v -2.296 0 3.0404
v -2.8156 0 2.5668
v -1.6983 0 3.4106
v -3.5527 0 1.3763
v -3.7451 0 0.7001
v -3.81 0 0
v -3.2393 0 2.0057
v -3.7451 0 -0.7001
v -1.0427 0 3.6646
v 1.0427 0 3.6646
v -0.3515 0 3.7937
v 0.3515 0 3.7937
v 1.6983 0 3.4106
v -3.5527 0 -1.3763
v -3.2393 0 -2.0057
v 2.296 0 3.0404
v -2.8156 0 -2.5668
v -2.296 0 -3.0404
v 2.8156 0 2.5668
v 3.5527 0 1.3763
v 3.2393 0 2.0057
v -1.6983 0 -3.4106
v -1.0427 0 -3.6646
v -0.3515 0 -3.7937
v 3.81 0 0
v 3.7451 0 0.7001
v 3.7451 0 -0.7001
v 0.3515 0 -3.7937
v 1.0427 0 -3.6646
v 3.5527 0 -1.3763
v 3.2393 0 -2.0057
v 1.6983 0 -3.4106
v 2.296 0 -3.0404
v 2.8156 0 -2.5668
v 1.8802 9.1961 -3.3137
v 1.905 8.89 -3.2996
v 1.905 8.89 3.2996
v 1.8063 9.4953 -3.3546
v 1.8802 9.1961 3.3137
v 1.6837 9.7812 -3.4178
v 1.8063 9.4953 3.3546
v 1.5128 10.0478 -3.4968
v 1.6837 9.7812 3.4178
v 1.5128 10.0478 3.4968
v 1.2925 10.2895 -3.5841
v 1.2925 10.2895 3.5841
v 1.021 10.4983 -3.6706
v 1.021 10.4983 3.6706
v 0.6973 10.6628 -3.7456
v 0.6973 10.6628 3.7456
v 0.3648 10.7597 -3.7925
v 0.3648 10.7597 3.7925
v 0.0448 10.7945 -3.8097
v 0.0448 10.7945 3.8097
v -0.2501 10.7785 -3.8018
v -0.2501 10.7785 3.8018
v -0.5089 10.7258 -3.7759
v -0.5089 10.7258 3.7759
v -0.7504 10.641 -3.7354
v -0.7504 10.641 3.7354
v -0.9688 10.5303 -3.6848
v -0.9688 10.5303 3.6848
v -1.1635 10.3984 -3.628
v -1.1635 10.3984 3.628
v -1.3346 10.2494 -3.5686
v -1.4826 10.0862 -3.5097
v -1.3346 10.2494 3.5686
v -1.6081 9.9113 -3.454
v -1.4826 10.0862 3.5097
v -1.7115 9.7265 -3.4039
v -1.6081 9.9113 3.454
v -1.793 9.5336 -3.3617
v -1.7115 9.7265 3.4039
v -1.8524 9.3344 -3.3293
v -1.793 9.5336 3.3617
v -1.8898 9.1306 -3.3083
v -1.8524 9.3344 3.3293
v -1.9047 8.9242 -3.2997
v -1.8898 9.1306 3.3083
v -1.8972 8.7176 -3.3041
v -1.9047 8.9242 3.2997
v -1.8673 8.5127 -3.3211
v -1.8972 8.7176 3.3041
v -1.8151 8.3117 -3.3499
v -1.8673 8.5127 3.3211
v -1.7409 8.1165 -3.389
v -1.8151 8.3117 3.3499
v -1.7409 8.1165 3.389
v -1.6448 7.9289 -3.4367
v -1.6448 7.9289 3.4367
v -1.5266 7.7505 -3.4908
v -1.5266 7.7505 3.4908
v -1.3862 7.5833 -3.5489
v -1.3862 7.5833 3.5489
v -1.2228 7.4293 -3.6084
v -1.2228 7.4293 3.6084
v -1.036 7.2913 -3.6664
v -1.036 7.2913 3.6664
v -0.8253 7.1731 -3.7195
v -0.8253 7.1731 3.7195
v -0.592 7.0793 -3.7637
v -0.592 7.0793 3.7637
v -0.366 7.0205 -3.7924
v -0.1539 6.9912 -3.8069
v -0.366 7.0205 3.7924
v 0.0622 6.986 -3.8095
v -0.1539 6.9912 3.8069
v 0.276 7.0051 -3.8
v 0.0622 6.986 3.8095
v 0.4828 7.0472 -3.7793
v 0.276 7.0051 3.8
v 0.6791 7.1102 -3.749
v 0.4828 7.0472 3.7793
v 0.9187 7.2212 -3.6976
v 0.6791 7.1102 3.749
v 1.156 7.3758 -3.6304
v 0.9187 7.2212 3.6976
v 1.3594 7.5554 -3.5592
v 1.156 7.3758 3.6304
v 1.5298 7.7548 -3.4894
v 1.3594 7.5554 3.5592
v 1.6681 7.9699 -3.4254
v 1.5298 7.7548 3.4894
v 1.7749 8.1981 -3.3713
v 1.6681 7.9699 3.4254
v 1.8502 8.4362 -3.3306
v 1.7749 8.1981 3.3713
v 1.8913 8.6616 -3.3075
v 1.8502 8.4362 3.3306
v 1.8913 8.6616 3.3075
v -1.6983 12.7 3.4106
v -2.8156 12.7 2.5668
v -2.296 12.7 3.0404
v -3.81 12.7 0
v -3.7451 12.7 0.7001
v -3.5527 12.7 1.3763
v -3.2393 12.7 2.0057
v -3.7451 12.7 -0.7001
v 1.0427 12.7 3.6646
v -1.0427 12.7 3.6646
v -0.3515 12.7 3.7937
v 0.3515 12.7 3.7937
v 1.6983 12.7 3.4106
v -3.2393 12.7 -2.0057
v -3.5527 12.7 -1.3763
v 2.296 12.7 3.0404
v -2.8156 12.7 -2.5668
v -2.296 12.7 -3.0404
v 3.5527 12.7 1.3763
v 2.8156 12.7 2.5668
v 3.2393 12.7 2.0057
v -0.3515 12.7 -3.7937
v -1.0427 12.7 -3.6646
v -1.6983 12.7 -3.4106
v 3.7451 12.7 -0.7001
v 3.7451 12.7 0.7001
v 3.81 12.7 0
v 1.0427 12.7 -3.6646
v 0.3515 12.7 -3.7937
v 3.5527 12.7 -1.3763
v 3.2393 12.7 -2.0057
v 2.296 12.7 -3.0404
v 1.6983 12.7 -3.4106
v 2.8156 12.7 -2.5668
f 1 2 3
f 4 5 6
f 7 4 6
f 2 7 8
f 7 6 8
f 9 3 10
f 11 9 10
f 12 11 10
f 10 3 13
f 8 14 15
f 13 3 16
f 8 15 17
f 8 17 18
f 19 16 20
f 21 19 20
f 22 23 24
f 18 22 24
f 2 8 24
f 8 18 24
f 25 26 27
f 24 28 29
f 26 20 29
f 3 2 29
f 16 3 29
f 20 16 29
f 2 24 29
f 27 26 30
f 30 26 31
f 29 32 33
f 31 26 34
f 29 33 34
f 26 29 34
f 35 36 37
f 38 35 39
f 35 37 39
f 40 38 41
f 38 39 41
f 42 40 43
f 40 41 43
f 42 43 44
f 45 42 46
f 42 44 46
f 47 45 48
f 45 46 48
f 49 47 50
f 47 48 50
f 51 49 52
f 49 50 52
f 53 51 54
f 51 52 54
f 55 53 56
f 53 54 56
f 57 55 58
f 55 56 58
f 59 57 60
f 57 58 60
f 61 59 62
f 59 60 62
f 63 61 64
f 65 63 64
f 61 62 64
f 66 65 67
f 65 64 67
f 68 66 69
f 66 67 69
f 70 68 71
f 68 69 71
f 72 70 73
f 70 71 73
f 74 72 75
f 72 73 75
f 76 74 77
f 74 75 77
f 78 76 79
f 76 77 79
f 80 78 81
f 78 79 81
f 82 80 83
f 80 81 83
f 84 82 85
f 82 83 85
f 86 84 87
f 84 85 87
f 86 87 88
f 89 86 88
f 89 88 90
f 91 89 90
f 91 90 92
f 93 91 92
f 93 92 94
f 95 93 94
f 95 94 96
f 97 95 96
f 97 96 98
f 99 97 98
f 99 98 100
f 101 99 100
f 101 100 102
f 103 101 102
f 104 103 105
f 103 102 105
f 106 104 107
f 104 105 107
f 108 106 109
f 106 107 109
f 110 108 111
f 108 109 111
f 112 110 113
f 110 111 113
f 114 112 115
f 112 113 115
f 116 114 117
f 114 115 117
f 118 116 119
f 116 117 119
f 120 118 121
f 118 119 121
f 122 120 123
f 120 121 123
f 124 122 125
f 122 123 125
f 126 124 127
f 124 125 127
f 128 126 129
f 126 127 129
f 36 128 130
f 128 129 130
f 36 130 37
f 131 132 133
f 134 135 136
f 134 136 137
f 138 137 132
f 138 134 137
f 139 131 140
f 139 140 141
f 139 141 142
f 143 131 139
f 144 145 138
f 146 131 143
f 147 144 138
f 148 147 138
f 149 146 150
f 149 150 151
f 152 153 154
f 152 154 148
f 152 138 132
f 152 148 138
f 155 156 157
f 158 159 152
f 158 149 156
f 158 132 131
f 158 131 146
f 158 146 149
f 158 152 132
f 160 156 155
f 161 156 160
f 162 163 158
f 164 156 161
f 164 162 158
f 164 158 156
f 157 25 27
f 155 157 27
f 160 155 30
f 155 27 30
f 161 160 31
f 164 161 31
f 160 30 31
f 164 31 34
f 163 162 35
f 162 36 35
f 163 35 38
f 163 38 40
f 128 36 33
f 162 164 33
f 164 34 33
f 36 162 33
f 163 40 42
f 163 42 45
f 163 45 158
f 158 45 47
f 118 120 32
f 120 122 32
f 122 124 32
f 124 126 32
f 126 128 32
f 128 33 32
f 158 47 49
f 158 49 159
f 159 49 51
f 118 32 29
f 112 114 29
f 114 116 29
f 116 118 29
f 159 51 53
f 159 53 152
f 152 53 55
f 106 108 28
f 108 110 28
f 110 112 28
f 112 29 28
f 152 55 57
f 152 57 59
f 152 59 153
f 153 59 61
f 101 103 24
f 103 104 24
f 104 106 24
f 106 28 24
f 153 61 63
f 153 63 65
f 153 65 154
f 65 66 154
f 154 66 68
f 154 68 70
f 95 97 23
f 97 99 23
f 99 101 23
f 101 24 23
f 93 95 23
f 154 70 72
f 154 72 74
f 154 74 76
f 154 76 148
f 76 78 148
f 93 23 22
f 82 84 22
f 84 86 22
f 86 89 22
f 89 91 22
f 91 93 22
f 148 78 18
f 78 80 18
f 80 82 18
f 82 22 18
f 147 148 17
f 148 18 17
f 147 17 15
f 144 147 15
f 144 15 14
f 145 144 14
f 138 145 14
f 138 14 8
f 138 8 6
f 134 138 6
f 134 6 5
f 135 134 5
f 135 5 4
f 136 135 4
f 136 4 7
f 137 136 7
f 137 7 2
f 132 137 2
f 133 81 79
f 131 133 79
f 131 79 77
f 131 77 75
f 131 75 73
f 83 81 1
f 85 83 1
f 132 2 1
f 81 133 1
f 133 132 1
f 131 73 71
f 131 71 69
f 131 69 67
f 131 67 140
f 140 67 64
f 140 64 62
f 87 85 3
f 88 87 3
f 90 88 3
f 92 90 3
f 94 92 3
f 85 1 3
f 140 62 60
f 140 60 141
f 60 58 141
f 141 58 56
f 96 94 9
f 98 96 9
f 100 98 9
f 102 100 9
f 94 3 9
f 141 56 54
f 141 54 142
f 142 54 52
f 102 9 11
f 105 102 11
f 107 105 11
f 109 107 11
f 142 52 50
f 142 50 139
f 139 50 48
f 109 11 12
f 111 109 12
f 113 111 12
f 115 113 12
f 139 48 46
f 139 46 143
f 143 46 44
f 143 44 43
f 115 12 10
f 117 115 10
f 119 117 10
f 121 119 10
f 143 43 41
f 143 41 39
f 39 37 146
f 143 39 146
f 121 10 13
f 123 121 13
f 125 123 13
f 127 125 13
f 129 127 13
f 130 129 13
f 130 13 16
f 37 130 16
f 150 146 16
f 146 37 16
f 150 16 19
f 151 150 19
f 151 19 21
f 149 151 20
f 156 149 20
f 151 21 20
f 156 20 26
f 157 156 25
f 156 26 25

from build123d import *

# Parameters (mm, degrees)
SKETCH1_R                      = 3.81
BOSS_EXTRUDE1_DEPTH            = 12.7
CUT_EXTRUDE1_REACH             = 15.796
CUT_EXTRUDE1_END_RADIUS        = 3.81
SKETCH2_R                      = 1.905
CUT_EXTRUDE1_DIRECTION_2_DEPTH = 19.05


with BuildPart() as part:
    # Sketch1 → Boss-Extrude1 (new body)
    with BuildSketch(Plane(origin=(0, 0, 0), x_dir=(1, 0, 0), z_dir=(0, 1, 0))):
        Circle(SKETCH1_R)
    extrude(amount=BOSS_EXTRUDE1_DEPTH)

    # Cut-Extrude1: up to this cylinder (the profile starts inside it)
    cut_extrude1_end = Plane(origin=(0, 8.89, 0), z_dir=(0, -1, 0)) * Cylinder(CUT_EXTRUDE1_END_RADIUS, 40.212, mode=Mode.PRIVATE)
    # Sketch2 → Cut-Extrude1 (cut, up to the surface)
    with BuildSketch(Plane.XY, mode=Mode.PRIVATE) as cut_extrude1_sk1:
        with Locations((0, 8.89)):
            Circle(SKETCH2_R)
    cut_extrude1_tool1 = extrude(cut_extrude1_sk1.sketch, amount=-CUT_EXTRUDE1_REACH, mode=Mode.PRIVATE) & cut_extrude1_end
    add(cut_extrude1_tool1.solids().sort_by_distance((0, 8.89, 0))[0], mode=Mode.SUBTRACT)

    # Sketch2 → Cut-Extrude1 direction 2 (cut)
    with BuildSketch(Plane.XY):
        with Locations((0, 8.89)):
            Circle(SKETCH2_R)
    extrude(amount=CUT_EXTRUDE1_DIRECTION_2_DEPTH, mode=Mode.SUBTRACT)


solid = part.part
